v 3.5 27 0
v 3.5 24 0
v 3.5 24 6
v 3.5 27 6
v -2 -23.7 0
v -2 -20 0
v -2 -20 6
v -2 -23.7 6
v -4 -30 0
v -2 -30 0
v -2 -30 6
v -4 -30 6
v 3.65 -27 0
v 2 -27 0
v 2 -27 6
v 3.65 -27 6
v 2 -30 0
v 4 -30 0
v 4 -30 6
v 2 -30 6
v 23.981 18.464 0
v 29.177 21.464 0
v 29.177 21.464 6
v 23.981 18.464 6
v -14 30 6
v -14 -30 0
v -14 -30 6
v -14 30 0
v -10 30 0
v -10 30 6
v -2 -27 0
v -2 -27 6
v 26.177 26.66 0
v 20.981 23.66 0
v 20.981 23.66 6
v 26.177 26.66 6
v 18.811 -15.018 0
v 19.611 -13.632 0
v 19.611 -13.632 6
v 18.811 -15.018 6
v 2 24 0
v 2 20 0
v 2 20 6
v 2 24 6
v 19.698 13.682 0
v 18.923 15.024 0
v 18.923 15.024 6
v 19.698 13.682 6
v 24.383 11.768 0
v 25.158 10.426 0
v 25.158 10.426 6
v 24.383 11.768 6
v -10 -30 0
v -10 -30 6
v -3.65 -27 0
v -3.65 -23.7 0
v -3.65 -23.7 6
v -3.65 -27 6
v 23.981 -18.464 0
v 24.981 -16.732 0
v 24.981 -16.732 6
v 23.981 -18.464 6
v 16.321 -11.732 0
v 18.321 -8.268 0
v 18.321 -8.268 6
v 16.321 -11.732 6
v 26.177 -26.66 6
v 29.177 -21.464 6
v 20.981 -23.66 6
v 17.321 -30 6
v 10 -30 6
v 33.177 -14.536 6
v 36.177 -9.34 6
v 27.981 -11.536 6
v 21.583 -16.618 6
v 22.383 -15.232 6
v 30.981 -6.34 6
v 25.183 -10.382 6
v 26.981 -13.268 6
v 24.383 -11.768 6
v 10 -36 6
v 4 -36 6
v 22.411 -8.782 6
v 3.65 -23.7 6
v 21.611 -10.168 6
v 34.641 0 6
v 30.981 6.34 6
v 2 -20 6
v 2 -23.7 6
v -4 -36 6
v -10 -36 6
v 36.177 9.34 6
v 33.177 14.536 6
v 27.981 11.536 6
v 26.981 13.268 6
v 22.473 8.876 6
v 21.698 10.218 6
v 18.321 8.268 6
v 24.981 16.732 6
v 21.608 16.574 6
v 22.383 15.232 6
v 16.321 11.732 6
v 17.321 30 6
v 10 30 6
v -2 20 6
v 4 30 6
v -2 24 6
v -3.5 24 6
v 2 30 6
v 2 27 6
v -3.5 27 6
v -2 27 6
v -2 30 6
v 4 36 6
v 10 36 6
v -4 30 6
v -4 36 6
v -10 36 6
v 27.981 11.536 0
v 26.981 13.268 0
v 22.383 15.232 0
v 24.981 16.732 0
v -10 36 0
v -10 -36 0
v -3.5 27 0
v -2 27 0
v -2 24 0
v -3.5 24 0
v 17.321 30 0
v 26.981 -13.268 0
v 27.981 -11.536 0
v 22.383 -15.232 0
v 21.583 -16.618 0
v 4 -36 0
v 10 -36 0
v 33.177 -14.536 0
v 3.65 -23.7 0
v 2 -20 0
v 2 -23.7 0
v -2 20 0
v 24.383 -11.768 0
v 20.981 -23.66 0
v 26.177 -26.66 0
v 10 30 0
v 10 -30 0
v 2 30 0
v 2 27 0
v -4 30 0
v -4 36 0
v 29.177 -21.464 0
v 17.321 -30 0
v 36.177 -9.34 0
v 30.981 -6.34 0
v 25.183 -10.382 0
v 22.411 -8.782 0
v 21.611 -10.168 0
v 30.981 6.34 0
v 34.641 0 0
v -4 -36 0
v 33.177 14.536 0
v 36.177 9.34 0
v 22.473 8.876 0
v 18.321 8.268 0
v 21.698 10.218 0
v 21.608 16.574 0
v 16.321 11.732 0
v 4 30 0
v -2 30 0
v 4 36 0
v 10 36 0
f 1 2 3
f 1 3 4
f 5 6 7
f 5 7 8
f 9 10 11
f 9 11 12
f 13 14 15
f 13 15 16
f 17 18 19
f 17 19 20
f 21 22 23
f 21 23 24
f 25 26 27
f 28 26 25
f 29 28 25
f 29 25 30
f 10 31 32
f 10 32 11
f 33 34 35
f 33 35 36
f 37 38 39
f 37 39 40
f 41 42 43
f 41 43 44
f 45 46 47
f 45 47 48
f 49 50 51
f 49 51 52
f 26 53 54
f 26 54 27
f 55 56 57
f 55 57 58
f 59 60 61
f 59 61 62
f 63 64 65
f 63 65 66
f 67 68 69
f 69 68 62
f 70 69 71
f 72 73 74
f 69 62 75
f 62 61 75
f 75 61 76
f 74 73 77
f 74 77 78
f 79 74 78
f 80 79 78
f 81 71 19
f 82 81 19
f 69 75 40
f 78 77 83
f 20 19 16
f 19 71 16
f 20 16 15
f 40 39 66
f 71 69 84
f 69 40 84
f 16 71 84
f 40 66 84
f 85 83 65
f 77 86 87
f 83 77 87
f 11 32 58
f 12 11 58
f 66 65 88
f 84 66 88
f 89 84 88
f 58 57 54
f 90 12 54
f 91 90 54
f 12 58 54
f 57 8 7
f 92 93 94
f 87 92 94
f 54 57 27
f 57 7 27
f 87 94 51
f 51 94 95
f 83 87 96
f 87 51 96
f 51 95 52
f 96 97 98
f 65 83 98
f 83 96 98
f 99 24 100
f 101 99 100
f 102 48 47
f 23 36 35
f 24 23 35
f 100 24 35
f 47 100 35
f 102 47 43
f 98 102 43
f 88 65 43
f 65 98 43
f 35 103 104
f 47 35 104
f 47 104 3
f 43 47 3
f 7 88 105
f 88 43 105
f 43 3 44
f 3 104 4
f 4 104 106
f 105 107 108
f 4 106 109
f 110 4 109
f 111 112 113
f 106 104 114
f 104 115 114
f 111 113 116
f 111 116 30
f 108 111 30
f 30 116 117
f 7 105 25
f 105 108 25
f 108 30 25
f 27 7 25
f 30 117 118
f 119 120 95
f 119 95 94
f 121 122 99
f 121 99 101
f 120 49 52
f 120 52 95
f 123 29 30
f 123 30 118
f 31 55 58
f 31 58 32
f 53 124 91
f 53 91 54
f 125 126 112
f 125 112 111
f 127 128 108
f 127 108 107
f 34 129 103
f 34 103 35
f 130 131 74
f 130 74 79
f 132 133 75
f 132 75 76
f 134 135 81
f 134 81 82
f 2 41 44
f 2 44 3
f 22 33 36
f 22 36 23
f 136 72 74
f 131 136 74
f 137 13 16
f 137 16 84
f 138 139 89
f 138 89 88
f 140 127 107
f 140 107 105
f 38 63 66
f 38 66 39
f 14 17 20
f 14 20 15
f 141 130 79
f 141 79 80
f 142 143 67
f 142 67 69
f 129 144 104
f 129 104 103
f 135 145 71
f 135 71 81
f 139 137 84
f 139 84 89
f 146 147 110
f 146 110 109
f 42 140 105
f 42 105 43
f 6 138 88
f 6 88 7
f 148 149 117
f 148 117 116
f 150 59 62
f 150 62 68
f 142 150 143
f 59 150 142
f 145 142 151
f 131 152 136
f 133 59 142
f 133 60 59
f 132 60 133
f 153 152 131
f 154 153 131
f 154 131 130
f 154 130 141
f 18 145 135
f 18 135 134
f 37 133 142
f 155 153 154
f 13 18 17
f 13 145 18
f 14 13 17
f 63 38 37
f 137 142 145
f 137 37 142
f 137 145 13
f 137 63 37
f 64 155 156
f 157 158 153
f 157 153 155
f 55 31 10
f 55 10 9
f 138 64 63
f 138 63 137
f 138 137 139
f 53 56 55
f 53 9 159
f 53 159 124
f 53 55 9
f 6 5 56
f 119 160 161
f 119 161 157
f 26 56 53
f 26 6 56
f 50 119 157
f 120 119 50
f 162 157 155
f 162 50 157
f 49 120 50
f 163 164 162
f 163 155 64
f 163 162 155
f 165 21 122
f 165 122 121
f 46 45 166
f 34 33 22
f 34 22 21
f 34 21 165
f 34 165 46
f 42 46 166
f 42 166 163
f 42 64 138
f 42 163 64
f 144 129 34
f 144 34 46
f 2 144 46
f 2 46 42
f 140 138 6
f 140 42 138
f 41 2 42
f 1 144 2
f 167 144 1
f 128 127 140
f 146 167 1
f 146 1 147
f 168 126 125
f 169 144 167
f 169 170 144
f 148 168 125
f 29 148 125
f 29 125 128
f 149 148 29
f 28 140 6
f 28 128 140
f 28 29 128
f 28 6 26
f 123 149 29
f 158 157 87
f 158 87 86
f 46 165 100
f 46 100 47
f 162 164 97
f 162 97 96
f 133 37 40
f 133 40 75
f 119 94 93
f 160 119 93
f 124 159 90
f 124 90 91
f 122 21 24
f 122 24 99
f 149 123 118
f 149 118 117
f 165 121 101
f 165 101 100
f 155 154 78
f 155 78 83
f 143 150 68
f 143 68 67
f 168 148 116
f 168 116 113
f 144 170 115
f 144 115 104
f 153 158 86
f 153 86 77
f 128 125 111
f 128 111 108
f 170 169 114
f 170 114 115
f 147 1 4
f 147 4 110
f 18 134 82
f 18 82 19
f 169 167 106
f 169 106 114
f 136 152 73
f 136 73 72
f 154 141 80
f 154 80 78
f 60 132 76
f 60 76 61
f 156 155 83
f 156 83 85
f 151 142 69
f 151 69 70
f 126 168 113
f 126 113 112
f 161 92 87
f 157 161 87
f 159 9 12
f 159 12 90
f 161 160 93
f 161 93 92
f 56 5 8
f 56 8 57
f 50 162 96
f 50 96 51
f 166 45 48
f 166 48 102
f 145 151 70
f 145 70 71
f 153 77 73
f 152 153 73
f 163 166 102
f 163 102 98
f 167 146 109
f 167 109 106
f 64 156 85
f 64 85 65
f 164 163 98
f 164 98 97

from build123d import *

# Parameters (mm, degrees)
BOSS_EXTRU_1_DEPTH = 6


with BuildPart() as part:
    # Esquisse1 → Boss.-Extru.1 (new body)
    with BuildSketch(Plane.XY):
        Polygon((10, 30), (17.320508076, 30), (20.980762114, 23.660254038), (26.176914536, 26.660254038), (29.176914536, 21.464101615), (23.980762114, 18.464101615), (24.980762114, 16.732050808), (22.382685902, 15.232050808), (21.607685902, 16.574390183), (18.92300715, 15.024390183), (19.69800715, 13.682050808), (16.320508076, 11.732050808), (18.320508076, 8.267949192), (21.69800715, 10.217949192), (22.47300715, 8.875609817), (25.157685902, 10.425609817), (24.382685902, 11.767949192), (26.980762114, 13.267949192), (27.980762114, 11.535898385), (33.176914536, 14.535898385), (36.176914536, 9.339745962), (30.980762114, 6.339745962), (34.641016151, 0), (30.980762114, -6.339745962), (36.176914536, -9.339745962), (33.176914536, -14.535898385), (27.980762114, -11.535898385), (26.980762114, -13.267949192), (24.382685902, -11.767949192), (25.182685902, -10.382308546), (22.41140461, -8.782308546), (21.61140461, -10.167949192), (18.320508076, -8.267949192), (16.320508076, -11.732050808), (19.61140461, -13.632050808), (18.81140461, -15.017691454), (21.582685902, -16.617691454), (22.382685902, -15.232050808), (24.980762114, -16.732050808), (23.980762114, -18.464101615), (29.176914536, -21.464101615), (26.176914536, -26.660254038), (20.980762114, -23.660254038), (17.320508076, -30), (10, -30), (10, -36), (4, -36), (4, -30), (2, -30), (2, -27), (3.65, -27), (3.65, -23.7), (2, -23.7), (2, -20), (-2, -20), (-2, -23.7), (-3.65, -23.7), (-3.65, -27), (-2, -27), (-2, -30), (-4, -30), (-4, -36), (-10, -36), (-10, -30), (-14, -30), (-14, 30), (-10, 30), (-10, 36), (-4, 36), (-4, 30), (-2, 30), (-2, 27), (-3.5, 27), (-3.5, 24), (-2, 24), (-2, 20), (2, 20), (2, 24), (3.5, 24), (3.5, 27), (2, 27), (2, 30), (4, 30), (4, 36), (10, 36), align=None)
    extrude(amount=BOSS_EXTRU_1_DEPTH)


solid = part.part
